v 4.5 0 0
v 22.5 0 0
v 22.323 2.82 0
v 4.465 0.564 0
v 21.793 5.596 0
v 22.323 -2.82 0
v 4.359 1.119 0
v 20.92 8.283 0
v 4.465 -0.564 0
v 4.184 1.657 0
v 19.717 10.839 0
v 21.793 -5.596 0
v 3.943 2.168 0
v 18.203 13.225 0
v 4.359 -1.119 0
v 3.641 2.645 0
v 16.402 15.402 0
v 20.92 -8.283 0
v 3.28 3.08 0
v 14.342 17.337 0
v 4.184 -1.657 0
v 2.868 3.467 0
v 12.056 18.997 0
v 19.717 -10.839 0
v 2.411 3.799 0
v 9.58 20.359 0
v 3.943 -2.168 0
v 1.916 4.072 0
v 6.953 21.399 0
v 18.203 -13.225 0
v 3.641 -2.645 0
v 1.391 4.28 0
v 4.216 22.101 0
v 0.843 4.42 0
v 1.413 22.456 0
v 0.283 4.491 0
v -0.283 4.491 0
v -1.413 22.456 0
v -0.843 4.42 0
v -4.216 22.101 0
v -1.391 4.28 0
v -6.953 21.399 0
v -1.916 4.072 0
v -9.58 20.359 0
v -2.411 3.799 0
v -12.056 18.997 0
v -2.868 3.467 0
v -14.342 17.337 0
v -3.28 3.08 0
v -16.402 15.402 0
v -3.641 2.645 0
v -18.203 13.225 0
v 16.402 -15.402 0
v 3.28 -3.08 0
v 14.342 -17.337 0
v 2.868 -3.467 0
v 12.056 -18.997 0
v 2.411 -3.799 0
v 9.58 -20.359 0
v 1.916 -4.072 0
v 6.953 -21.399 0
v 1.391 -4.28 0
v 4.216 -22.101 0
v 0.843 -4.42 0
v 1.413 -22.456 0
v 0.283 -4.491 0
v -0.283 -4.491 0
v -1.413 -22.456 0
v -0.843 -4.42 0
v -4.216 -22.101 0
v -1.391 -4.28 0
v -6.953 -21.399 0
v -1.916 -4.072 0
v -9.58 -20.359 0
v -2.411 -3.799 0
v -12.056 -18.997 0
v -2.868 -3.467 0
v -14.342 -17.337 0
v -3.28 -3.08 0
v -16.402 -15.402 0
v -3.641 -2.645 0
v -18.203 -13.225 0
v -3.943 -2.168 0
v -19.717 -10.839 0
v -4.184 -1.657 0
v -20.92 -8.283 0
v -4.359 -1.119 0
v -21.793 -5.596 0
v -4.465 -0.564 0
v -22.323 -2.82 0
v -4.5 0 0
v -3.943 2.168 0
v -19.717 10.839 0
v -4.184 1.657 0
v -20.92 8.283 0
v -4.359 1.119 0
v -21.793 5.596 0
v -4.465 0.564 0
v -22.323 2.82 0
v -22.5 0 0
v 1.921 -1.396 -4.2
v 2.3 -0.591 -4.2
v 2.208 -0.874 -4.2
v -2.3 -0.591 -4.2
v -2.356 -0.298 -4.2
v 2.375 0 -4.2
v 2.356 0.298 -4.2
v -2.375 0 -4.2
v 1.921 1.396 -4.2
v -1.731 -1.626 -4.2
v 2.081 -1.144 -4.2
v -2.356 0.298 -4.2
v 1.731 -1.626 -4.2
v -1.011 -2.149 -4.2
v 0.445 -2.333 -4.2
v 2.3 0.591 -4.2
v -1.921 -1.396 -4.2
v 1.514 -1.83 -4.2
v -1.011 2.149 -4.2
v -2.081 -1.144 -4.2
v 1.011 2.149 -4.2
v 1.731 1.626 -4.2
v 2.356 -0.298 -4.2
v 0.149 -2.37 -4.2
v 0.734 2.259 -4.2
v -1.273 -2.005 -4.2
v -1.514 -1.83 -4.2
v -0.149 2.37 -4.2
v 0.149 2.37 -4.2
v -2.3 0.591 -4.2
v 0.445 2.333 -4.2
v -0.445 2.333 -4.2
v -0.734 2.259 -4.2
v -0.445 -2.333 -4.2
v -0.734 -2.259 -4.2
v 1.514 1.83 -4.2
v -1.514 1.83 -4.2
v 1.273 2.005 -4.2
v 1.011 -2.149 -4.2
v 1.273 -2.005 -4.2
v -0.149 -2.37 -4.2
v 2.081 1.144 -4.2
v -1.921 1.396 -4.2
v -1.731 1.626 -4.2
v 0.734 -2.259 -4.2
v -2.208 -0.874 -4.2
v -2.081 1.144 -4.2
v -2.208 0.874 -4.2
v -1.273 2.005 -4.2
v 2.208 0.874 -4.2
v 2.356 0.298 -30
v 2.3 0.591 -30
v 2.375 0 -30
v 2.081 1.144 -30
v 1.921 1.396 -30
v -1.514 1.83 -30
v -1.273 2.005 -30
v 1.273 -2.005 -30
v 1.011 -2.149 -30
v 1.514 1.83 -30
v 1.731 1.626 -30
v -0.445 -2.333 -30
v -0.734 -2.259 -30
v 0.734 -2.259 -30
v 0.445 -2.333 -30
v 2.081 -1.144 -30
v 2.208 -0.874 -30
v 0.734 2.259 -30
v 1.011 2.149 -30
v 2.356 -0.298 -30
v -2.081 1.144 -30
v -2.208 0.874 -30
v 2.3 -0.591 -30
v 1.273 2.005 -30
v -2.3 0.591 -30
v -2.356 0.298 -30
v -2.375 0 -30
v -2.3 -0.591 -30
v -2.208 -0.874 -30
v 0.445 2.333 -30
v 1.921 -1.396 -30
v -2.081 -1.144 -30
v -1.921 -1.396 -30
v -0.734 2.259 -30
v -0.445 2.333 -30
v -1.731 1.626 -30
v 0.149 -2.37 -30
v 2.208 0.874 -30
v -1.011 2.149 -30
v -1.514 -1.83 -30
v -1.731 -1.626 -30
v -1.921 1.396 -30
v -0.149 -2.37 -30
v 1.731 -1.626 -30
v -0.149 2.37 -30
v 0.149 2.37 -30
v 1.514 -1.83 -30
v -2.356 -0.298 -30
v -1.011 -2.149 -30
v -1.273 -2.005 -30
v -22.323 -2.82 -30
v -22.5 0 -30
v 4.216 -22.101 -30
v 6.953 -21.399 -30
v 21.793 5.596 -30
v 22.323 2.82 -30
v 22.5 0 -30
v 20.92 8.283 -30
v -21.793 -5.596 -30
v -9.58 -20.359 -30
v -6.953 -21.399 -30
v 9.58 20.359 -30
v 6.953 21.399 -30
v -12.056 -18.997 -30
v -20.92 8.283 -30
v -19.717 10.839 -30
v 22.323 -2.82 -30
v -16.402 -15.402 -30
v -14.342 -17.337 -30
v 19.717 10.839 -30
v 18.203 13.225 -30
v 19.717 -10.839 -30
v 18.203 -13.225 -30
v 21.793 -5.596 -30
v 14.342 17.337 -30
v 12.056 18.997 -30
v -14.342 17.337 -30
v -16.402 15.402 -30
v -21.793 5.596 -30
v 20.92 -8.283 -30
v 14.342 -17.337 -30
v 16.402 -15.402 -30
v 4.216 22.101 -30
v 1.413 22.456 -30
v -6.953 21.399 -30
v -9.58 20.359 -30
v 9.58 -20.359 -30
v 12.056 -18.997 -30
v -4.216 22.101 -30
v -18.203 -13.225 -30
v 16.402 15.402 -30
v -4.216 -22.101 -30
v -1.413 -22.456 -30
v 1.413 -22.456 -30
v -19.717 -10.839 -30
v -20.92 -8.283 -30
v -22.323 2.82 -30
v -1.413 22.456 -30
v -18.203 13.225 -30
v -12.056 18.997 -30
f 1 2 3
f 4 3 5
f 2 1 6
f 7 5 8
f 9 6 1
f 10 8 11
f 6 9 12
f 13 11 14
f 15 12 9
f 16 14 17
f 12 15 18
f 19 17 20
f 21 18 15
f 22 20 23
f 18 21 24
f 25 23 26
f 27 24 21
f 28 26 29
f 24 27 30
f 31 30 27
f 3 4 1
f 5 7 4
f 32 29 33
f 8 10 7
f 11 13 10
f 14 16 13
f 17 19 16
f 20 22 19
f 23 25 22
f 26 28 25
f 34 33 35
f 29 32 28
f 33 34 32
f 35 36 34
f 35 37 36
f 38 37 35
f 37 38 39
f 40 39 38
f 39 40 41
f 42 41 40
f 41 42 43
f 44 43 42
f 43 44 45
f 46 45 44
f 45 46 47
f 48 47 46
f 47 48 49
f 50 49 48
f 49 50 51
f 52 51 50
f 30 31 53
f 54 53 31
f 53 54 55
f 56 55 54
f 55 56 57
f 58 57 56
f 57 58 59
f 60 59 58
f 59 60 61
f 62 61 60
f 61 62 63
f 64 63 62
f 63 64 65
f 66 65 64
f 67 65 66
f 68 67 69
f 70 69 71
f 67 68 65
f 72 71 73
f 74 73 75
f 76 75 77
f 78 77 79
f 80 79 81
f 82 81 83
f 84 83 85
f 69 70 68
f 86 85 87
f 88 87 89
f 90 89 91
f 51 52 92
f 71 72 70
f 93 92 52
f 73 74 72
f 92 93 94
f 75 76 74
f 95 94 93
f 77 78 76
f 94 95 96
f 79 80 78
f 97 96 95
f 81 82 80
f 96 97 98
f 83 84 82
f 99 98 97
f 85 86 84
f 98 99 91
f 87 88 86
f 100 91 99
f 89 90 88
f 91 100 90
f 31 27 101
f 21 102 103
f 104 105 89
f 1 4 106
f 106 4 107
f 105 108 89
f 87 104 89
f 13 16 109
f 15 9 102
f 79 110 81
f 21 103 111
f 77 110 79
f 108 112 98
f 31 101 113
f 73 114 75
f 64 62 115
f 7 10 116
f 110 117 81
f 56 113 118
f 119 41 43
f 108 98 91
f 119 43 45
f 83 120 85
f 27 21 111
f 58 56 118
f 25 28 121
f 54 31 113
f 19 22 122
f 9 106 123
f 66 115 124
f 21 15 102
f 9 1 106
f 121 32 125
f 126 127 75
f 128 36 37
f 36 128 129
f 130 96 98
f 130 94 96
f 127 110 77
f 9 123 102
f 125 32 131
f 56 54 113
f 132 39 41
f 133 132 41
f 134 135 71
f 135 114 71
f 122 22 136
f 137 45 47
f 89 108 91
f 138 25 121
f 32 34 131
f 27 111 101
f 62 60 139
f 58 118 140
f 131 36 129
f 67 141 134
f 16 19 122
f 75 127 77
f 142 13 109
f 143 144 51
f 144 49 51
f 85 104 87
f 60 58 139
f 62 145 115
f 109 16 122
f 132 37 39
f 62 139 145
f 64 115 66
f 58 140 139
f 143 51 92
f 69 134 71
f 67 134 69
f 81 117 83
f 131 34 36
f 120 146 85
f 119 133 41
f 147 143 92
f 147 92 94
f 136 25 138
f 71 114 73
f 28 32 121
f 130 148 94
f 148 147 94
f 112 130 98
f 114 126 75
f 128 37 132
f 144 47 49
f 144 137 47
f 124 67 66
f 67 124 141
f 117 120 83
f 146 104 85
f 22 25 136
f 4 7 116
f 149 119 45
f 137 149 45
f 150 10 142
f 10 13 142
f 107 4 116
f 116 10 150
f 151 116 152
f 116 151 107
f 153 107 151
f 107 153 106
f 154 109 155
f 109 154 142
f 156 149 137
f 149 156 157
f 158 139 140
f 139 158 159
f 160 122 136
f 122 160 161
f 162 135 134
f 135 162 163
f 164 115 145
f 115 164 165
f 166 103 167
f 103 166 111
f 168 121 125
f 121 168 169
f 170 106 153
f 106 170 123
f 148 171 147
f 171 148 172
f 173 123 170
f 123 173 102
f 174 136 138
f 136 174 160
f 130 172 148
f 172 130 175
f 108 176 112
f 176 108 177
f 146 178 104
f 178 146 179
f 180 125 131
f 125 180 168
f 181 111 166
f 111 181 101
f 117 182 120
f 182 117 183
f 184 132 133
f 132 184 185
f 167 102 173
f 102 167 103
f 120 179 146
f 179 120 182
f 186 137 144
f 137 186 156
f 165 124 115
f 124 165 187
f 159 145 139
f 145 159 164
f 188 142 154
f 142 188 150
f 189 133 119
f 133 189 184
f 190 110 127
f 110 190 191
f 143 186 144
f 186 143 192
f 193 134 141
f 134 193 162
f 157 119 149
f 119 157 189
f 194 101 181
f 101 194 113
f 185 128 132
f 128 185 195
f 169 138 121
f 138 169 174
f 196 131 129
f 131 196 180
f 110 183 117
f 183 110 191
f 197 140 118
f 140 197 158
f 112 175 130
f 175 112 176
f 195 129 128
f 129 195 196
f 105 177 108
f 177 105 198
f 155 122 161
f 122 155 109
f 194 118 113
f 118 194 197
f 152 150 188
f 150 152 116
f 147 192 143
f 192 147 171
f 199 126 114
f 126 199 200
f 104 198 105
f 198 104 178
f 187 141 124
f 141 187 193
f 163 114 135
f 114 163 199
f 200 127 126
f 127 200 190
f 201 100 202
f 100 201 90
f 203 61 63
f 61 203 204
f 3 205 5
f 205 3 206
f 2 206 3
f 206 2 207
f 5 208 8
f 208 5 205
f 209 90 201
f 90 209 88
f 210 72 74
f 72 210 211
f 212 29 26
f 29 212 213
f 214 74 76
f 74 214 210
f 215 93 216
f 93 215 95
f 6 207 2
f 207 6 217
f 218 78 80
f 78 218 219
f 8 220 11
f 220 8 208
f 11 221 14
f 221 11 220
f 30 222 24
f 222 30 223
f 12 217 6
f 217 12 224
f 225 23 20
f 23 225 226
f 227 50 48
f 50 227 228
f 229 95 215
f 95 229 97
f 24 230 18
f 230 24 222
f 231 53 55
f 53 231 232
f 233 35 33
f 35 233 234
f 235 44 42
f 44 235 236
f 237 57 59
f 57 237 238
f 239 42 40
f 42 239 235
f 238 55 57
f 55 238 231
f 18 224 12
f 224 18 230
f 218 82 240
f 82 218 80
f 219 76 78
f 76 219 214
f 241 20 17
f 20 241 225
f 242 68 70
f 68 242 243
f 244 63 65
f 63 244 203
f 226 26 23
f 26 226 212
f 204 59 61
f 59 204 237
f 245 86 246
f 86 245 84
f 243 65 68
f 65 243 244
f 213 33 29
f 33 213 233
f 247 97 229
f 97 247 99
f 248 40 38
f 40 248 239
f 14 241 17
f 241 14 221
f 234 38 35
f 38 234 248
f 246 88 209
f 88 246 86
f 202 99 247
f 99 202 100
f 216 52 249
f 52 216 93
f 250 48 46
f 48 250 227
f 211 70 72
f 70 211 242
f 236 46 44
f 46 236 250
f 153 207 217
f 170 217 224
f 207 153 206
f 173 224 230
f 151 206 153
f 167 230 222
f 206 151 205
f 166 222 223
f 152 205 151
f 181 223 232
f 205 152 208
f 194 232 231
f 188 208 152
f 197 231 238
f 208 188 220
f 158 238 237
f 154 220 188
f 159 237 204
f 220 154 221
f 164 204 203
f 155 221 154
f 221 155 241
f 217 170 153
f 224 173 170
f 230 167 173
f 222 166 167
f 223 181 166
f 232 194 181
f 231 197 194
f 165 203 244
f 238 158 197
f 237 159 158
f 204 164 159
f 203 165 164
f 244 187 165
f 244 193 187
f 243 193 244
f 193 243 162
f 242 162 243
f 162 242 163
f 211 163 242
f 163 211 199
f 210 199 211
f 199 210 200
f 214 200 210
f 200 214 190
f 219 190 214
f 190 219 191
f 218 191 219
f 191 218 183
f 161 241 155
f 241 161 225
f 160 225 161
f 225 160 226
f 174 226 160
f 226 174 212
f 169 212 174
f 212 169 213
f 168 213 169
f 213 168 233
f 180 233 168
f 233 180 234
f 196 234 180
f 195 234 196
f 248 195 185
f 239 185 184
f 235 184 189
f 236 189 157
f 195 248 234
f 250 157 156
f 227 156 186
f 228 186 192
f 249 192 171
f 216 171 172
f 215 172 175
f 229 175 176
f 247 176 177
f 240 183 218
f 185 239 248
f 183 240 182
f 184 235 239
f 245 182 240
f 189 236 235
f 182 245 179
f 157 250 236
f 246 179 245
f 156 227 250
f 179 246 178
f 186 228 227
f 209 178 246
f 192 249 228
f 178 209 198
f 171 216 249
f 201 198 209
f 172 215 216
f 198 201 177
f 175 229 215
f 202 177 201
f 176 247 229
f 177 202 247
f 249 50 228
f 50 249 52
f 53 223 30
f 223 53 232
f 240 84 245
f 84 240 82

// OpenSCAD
$fn = 50;

difference() {
	union() {
		translate(v = [0, 0, -30.0]) {
			cylinder(h = 30, r = 22.5);
		}
	}
	union() {
		translate(v = [0, 0, 0]) {
			rotate(a = [0, 0, 0]) {
				difference() {
					union() {
						translate(v = [0, 0, -33.0]) {
							cylinder(h = 33, r = 2.25);
						}
						translate(v = [0, 0, -4.2]) {
							cylinder(h = 4.2, r1 = 2.375, r2 = 4.5);
						}
						translate(v = [0, 0, -33.0]) {
							cylinder(h = 33, r = 2.375);
						}
						translate(v = [0, 0, -33.0]) {
							cylinder(h = 33, r = 2.25);
						}
					}
					union();
				}
			}
		}
	}
}
